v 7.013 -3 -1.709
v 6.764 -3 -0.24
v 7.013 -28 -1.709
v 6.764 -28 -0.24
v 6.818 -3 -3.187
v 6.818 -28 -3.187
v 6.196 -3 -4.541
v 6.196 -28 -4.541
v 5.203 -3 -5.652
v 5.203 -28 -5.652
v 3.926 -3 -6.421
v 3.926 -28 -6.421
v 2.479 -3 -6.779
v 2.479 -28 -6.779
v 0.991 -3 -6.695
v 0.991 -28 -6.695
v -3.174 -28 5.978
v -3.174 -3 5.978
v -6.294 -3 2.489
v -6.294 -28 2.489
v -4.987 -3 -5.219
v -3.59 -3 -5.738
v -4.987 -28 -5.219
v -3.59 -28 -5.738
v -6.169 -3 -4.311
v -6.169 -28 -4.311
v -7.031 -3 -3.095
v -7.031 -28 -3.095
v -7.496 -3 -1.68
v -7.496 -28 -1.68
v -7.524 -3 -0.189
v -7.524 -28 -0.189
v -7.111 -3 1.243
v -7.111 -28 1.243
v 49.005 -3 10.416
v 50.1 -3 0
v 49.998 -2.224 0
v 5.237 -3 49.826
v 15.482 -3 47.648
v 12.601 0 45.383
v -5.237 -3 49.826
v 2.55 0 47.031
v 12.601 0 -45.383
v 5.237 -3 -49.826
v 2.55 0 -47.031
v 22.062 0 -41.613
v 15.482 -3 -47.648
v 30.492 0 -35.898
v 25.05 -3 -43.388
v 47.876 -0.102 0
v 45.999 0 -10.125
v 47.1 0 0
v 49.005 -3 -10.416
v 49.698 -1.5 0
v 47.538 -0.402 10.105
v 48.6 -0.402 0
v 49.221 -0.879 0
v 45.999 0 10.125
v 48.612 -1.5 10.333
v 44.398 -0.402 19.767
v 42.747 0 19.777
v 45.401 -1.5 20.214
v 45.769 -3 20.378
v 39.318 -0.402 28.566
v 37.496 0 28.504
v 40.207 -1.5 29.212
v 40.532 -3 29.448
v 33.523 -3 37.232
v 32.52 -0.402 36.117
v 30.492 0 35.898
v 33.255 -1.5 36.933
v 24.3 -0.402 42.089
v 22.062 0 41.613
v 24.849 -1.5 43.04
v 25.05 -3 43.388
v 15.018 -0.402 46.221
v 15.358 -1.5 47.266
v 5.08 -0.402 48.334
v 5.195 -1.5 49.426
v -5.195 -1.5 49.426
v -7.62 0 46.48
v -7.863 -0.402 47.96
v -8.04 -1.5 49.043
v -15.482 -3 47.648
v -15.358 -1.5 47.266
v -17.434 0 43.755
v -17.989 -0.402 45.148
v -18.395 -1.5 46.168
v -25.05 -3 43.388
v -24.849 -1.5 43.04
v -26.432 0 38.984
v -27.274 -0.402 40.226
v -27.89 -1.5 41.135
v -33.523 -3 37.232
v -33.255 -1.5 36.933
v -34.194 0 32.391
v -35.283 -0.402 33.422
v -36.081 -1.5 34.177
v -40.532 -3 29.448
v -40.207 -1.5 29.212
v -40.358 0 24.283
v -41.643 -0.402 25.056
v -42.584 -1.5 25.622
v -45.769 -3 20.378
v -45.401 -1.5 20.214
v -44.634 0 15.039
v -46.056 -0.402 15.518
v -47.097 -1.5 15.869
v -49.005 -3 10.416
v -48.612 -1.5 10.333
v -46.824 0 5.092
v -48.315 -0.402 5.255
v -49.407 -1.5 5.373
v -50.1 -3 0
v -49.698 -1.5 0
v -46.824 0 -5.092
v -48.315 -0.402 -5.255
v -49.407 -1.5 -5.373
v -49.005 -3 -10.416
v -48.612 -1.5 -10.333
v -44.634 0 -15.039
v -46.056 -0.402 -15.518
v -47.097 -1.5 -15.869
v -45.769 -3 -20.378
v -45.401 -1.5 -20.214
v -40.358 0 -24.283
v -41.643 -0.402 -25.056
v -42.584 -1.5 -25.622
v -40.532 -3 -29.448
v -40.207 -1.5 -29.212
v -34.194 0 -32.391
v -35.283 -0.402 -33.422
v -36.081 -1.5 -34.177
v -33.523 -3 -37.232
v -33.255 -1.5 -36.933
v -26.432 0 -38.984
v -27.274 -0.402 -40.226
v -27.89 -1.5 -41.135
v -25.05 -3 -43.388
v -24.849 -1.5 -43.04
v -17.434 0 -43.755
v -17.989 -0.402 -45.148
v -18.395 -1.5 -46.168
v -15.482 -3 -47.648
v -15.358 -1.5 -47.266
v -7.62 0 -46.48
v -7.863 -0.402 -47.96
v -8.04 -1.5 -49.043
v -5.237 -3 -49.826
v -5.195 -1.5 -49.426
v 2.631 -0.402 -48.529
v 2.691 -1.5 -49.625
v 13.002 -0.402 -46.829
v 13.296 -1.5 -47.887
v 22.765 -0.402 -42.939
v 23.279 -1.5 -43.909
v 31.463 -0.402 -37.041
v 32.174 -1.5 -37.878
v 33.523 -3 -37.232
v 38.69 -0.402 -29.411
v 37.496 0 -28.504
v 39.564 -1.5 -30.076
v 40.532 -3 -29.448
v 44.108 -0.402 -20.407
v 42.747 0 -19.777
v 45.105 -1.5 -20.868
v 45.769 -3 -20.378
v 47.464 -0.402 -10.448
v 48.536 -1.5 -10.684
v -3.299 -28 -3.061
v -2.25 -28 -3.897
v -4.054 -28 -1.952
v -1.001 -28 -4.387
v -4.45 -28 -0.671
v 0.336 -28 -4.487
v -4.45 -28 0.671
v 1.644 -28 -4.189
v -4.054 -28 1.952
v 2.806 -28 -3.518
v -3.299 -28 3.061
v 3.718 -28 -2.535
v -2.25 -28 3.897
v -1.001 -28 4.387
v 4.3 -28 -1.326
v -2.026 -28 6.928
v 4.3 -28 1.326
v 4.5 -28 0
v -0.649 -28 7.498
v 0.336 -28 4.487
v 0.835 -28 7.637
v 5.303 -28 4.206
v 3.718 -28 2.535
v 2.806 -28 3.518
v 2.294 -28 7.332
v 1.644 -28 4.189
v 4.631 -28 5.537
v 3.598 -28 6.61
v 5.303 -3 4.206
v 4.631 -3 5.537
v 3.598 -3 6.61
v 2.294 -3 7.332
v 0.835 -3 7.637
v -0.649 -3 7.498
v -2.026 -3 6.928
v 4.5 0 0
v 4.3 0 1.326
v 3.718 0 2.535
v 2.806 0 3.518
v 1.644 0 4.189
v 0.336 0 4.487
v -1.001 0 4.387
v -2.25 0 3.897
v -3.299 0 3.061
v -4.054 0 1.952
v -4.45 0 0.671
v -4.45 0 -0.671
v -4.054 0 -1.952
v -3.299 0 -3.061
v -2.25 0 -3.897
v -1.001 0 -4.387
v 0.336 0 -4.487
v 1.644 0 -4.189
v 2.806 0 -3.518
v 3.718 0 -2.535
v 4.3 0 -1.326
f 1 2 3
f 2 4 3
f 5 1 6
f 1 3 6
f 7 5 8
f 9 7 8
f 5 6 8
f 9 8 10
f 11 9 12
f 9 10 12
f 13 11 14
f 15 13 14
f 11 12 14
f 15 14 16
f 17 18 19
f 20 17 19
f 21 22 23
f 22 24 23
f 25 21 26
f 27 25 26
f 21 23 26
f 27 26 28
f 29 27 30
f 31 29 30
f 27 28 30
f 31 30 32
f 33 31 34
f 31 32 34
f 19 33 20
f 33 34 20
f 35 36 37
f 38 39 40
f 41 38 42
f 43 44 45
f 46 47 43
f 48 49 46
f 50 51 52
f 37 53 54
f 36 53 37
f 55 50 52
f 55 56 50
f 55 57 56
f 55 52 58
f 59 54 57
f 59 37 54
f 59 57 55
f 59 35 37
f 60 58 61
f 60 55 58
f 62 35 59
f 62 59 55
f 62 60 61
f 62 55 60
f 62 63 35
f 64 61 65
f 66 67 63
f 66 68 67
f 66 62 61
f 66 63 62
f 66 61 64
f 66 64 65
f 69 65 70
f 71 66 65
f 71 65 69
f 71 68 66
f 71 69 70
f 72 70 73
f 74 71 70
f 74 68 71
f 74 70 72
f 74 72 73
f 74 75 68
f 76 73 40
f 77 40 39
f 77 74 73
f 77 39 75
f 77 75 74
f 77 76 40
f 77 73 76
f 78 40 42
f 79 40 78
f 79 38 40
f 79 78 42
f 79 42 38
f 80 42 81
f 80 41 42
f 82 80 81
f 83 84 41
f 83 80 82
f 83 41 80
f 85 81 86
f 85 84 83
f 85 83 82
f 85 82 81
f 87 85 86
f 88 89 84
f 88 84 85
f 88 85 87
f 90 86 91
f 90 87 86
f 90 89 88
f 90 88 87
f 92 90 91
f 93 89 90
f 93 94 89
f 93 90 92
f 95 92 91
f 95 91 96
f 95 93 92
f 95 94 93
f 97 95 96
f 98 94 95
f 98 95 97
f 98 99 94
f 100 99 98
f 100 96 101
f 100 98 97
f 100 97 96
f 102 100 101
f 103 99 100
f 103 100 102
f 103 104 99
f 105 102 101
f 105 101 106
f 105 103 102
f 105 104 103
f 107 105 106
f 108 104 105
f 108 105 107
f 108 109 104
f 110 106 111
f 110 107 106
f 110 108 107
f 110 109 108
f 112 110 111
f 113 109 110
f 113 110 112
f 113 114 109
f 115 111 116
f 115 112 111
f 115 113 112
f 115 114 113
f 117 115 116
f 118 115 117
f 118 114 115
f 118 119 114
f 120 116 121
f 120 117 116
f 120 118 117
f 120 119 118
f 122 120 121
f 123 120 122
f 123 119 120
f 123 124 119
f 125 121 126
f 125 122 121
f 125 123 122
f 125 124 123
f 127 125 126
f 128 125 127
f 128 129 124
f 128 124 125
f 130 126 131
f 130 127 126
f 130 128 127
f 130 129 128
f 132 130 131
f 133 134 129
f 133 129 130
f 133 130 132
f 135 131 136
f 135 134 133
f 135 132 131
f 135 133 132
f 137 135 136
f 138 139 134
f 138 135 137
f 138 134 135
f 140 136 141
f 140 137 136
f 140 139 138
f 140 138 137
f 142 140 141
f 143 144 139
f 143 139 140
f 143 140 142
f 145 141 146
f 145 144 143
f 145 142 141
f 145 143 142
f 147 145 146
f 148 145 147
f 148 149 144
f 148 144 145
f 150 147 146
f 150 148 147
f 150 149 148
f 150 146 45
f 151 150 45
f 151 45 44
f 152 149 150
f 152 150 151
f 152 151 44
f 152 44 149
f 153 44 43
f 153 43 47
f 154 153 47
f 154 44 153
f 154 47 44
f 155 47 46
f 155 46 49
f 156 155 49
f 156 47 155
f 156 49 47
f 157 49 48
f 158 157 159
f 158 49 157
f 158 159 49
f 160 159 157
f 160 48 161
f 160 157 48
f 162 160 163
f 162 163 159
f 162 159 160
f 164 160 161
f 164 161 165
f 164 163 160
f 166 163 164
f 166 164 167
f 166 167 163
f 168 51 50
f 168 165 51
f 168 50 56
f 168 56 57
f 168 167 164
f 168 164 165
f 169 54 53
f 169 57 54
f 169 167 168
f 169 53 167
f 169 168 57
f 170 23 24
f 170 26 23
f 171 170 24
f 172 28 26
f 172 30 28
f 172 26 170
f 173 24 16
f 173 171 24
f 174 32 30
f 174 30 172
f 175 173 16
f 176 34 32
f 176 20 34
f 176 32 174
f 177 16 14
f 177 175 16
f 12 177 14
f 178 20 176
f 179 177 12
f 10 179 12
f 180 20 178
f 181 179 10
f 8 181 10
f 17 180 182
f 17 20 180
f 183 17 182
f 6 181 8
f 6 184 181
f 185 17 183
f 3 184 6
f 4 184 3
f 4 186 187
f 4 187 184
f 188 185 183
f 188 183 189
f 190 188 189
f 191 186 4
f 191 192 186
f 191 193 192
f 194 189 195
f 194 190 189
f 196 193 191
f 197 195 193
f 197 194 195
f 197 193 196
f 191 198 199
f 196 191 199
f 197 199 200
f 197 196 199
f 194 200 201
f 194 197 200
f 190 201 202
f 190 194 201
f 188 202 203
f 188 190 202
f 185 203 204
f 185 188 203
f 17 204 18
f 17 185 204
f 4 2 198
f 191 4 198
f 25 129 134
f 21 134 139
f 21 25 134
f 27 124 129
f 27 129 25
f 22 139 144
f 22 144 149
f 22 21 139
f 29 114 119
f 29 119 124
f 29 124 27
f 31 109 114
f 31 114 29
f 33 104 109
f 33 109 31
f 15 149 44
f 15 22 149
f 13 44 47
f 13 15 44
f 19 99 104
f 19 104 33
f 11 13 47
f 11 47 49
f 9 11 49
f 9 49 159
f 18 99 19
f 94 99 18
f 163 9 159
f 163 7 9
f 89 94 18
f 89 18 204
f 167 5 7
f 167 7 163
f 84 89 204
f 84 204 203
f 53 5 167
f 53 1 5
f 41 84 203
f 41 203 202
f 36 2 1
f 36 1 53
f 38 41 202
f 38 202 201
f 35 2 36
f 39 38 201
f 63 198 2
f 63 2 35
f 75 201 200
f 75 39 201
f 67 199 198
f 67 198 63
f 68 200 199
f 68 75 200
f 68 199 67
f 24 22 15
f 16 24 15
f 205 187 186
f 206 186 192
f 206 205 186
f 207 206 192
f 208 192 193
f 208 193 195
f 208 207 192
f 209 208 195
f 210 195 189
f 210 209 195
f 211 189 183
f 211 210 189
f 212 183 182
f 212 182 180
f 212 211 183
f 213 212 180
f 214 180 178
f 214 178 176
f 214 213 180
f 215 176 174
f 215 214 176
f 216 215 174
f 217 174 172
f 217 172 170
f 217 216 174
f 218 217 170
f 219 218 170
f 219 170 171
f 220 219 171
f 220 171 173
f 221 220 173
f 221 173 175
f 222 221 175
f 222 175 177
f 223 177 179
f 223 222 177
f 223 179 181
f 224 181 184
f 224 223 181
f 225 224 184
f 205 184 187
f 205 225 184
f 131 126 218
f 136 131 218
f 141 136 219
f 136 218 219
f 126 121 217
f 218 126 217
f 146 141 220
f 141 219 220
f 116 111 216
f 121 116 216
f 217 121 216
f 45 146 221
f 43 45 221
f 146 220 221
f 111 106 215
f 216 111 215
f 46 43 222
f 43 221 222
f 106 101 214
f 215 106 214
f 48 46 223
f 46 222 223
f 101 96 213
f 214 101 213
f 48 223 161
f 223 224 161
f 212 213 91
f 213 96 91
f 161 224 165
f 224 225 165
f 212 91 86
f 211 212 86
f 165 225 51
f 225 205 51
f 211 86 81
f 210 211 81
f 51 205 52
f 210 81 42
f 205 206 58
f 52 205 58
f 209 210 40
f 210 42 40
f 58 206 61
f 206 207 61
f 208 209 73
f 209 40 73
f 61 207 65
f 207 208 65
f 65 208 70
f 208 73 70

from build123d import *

# Parameters (mm, degrees)
F0_R     = 50.1
F0_R_2   = 4.5
F1_DEPTH = 3
F2_R     = 4.5
F3_DEPTH = 25
F4_R     = 2.99999
F5_R     = 5


# Not quite as in the source:
# - a fillet or chamfer is up to 0.001 mm smaller than in the source, because OpenCascade refuses the exact size


with BuildPart() as f1:
    # F0 (on Front) → F1 (new body)
    with BuildSketch(Plane.XZ):
        Circle(F0_R)
        Circle(F0_R_2, mode=Mode.SUBTRACT)
    extrude(amount=F1_DEPTH)

    # F2 (on face) → F3 (join)
    with BuildSketch(Plane.XZ.offset(3)):
        Polygon((9.4680966624, -8.46690492), (2.598506421, 12.4330646951), (-12.0666030834, -3.9661597751), align=None)
        Circle(F2_R, mode=Mode.SUBTRACT)
    extrude(amount=F3_DEPTH)

    # F4 (radius 3 in the source; OpenCascade refuses exactly that, so slightly less here)
    f4_edges = [f1.edges().sort_by_distance(p)[0] for p in [
        (-50.1, 0, 0),
    ]]
    fillet(f4_edges, radius=F4_R)

    # F5
    f5_edges = [f1.edges().sort_by_distance(p)[0] for p in [
        (2.598506, -15.5, 12.433065),
        (-12.066603, -15.5, -3.96616),
        (9.468097, -15.5, -8.466905),
    ]]
    fillet(f5_edges, radius=F5_R)


solid = f1.part
